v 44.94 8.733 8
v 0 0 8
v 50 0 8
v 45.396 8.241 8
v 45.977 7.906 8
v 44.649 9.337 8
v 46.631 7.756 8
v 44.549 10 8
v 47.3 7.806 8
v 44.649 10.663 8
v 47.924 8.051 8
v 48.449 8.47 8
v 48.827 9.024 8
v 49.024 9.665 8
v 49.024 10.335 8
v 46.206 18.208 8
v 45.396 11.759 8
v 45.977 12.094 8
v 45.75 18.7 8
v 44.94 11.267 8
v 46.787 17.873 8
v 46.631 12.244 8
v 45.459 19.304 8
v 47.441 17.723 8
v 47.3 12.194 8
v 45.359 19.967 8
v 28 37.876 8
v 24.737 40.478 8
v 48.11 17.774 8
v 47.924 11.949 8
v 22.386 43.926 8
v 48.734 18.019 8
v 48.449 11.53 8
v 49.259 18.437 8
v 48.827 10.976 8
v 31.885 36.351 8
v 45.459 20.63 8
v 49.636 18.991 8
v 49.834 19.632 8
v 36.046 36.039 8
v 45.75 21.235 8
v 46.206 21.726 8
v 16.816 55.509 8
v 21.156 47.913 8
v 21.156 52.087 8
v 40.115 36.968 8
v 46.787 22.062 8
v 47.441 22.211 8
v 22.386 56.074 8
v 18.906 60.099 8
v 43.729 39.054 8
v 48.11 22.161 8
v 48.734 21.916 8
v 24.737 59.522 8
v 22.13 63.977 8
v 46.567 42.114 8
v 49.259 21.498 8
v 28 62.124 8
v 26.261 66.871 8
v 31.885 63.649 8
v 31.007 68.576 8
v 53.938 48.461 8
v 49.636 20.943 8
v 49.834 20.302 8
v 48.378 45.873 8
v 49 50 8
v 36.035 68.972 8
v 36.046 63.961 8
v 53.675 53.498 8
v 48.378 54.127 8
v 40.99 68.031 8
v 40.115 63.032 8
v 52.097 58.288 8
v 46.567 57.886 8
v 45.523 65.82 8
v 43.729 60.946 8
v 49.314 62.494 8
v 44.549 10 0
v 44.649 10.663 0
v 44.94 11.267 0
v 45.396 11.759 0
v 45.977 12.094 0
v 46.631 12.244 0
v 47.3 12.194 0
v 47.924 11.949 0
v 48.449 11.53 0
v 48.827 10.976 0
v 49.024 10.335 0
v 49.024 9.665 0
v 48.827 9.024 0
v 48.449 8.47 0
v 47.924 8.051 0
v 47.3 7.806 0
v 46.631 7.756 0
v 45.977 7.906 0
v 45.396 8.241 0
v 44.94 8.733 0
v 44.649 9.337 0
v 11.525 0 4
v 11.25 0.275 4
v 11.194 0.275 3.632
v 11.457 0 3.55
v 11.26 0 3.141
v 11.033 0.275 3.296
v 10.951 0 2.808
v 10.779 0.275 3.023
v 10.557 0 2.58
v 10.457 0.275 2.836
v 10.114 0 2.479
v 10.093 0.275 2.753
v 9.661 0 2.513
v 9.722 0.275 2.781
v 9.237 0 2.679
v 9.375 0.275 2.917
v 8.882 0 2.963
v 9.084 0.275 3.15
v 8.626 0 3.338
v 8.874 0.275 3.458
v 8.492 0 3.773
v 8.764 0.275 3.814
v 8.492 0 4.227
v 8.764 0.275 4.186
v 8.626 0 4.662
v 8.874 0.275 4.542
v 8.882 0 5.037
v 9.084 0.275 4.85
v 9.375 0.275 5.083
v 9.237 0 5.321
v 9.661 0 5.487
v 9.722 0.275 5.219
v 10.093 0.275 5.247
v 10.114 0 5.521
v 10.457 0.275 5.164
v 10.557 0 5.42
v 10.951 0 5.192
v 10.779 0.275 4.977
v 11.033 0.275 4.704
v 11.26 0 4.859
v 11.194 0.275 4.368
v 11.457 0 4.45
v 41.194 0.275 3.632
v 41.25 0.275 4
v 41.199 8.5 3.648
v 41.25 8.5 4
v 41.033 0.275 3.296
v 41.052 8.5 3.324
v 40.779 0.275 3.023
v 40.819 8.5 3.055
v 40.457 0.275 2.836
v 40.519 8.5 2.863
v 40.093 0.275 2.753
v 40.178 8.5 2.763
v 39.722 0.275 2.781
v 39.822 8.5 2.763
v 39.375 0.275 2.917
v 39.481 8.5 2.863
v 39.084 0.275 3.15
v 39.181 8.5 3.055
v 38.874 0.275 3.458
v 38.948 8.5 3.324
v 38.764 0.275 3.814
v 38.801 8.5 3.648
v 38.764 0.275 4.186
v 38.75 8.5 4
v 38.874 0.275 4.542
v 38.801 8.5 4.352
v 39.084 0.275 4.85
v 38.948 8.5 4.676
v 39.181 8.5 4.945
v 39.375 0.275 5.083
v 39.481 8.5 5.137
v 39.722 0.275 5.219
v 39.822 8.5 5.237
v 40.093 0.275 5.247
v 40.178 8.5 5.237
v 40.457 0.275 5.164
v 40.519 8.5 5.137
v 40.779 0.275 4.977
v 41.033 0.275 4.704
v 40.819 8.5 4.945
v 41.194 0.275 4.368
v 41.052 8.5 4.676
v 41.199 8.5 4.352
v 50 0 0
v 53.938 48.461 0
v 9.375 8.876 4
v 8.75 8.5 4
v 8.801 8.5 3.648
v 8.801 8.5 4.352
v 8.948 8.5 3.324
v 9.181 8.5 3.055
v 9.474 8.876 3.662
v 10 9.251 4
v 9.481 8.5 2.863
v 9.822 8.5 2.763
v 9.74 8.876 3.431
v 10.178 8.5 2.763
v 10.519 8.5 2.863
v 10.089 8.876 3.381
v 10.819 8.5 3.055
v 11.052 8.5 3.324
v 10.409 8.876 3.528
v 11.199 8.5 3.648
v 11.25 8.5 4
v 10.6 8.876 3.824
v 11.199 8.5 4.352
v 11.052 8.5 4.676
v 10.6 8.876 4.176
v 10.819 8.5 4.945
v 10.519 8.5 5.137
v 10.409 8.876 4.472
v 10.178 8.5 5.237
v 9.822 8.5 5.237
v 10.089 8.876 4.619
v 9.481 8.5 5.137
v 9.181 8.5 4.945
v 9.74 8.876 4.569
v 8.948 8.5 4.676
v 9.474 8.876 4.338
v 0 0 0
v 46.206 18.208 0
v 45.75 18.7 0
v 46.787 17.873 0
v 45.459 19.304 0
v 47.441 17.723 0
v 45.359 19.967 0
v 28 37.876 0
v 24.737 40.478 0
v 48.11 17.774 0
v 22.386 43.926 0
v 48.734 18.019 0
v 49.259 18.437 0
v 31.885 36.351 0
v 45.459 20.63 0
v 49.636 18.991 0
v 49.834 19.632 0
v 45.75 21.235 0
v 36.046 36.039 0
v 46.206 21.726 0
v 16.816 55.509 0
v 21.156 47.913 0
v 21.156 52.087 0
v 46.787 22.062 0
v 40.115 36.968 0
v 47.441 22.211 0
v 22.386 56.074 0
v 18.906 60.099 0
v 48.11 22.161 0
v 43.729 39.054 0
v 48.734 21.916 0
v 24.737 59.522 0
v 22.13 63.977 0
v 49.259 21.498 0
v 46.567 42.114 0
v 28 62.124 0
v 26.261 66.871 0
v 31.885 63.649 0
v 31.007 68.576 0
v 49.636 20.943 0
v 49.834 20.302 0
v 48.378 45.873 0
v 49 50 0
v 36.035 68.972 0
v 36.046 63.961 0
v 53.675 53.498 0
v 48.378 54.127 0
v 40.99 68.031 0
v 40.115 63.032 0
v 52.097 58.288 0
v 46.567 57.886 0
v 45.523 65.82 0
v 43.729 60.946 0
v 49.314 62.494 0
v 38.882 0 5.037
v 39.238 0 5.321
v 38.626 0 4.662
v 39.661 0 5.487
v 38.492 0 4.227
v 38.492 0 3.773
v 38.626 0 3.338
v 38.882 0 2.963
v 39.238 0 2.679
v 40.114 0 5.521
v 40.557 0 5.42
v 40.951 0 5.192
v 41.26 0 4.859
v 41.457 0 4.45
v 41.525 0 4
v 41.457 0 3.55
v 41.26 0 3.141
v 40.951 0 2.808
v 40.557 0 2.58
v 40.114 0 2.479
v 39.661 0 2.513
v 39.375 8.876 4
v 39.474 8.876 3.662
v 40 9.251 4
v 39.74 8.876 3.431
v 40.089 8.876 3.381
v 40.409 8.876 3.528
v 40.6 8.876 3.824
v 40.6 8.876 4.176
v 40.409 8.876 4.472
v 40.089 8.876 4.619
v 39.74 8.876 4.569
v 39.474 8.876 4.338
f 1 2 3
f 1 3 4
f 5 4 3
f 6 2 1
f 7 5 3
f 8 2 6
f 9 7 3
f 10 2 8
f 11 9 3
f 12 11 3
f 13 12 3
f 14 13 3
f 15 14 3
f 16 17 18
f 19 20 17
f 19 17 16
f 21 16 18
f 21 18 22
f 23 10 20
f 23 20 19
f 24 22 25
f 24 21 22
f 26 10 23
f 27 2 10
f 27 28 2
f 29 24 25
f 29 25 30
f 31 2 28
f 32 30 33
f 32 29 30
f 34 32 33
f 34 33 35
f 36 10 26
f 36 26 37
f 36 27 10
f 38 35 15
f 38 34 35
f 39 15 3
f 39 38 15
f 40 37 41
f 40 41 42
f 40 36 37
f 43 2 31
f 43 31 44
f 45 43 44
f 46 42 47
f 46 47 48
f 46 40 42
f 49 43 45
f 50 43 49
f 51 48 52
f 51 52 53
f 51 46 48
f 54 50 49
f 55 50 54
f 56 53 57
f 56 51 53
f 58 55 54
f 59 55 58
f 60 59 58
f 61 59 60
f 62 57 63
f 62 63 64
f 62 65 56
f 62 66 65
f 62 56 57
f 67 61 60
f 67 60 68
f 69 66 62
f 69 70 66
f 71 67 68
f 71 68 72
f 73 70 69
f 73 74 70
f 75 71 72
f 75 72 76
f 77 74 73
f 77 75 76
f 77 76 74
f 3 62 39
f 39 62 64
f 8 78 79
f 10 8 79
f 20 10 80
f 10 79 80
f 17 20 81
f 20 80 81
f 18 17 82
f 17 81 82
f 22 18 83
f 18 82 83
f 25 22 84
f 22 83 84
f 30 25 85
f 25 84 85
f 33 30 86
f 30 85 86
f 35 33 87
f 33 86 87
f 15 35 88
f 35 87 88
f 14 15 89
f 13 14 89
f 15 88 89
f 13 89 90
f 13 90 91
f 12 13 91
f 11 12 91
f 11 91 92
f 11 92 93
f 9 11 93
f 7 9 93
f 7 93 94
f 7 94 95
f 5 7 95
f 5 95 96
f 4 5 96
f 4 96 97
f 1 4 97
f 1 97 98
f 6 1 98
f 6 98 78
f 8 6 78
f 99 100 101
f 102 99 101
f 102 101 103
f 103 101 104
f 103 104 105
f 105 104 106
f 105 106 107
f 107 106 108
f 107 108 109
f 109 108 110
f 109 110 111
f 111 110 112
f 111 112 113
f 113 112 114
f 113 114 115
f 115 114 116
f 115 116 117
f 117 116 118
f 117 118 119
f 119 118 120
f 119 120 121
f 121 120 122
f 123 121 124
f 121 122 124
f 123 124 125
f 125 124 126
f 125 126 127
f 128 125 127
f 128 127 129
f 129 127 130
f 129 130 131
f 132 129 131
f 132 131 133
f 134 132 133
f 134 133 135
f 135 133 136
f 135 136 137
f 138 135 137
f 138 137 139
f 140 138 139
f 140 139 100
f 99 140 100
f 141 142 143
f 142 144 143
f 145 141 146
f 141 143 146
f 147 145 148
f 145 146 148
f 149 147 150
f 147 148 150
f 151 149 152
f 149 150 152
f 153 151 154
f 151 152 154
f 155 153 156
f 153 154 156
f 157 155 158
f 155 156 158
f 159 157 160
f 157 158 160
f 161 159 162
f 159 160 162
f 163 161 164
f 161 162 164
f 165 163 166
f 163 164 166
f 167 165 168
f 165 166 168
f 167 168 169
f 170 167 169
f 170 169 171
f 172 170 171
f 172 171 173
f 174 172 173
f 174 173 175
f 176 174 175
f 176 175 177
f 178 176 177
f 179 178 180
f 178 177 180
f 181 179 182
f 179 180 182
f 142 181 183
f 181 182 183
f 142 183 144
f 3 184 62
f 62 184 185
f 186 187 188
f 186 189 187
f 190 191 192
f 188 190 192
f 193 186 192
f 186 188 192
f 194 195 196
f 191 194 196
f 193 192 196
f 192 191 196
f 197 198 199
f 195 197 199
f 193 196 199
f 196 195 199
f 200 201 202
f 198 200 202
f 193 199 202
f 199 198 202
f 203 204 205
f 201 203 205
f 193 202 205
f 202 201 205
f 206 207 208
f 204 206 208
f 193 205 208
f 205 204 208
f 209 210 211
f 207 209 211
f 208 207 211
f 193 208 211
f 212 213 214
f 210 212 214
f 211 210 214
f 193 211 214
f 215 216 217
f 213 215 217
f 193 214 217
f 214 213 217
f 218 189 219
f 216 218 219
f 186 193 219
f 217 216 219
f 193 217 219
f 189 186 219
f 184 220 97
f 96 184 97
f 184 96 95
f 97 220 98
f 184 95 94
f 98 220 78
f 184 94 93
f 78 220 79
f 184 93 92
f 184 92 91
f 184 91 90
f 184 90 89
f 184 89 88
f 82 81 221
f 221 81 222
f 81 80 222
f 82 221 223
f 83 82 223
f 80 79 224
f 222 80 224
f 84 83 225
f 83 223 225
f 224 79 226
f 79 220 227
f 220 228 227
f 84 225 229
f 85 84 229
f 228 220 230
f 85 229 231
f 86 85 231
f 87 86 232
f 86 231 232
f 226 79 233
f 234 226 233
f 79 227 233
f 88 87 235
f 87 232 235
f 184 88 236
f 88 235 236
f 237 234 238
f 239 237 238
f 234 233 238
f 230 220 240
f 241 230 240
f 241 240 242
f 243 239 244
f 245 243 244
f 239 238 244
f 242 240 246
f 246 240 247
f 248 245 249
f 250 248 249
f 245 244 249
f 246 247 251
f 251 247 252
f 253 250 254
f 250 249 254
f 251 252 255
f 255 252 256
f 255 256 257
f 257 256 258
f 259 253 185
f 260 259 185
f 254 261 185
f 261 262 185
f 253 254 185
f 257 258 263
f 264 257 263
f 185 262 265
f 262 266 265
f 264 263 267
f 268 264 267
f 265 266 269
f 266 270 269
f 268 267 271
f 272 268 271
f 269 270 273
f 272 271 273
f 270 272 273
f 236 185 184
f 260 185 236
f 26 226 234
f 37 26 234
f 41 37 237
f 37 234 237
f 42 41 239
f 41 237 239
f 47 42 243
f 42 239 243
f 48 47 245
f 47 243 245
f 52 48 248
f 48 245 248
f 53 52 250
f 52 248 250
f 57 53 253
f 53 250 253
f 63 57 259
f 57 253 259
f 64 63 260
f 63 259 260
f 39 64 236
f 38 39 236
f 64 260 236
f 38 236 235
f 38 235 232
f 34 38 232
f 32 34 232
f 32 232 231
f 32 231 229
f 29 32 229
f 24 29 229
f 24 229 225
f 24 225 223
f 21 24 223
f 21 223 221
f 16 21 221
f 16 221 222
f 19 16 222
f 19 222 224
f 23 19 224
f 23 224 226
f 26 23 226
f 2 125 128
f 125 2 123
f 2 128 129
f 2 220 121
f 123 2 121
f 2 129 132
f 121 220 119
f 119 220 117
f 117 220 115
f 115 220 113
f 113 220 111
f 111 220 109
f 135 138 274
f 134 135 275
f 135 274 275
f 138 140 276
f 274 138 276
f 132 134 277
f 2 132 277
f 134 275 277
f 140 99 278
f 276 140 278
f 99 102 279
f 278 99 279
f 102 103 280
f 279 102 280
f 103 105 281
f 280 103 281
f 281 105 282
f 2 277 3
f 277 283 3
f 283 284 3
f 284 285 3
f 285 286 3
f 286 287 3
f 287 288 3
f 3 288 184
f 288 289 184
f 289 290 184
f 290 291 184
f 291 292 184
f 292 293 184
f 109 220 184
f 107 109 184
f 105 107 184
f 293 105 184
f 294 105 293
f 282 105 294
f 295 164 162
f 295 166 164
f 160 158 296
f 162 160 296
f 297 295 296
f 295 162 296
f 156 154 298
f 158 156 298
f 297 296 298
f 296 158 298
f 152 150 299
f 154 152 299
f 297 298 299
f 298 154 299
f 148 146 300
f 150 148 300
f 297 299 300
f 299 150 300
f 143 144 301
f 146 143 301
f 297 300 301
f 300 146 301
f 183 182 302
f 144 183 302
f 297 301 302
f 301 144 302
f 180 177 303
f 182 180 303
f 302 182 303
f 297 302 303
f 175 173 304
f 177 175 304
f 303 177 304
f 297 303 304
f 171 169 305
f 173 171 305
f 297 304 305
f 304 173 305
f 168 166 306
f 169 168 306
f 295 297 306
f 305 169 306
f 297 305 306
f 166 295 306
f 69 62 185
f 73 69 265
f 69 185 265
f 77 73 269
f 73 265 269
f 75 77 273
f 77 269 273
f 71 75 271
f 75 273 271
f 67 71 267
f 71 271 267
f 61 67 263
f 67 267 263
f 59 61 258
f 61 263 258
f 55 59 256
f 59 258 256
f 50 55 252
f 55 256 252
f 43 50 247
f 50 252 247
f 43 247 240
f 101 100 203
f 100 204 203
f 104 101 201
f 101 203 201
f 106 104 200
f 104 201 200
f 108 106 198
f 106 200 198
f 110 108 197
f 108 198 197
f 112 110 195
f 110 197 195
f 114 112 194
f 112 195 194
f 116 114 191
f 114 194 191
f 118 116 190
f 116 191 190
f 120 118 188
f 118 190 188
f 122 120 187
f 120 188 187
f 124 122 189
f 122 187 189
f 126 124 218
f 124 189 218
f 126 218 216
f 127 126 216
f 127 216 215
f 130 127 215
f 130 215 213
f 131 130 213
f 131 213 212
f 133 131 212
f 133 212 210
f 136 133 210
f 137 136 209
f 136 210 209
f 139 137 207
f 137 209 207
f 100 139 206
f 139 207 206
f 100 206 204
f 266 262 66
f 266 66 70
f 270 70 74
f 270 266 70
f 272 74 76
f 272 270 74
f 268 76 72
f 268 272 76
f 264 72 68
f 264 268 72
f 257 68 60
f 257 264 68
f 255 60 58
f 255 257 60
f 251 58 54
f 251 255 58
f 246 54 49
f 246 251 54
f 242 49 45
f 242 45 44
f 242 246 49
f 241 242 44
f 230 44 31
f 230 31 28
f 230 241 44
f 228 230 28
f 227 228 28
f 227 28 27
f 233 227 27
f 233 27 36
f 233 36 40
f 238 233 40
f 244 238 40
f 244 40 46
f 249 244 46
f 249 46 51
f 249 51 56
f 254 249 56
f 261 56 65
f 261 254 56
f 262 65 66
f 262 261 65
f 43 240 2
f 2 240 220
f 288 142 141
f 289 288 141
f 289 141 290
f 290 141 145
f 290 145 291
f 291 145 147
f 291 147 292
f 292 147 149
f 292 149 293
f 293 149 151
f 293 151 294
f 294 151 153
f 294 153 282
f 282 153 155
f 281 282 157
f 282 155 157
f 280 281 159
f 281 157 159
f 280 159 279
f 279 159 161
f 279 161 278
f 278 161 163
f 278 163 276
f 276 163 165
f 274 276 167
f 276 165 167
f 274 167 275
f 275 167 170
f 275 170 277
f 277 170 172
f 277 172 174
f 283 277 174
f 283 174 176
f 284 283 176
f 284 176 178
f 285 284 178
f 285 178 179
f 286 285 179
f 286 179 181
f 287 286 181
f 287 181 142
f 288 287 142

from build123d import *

# Parameters (mm, degrees)
SKETCH_1_R                   = 19
SKETCH_1_R_2                 = 14
EXTRUDE_1_DEPTH              = 8
HOLE_WIZARD_M4_1_D           = 4.5
HOLE_WIZARD_M3_1_D           = 2.5
HOLE_WIZARD_M3_1_DEPTH       = 8.5
HOLE_WIZARD_M3_1_CSINK_D     = 3.05
HOLE_WIZARD_M3_1_CSINK_ANGLE = 90
HOLE_WIZARD_M3_1_TIP         = 0.751075774


with BuildPart() as part:
    # 스케치1 → 보스-돌출1 (new body)
    # profile 1 of 2: a face of its own
    with BuildSketch(Plane.XY):
        with BuildLine():
            Line((16.816107383, 55.508724832), (0, 0))
            Line((0, 0), (50, 0))
            Line((50, 0), (53.937590447, 48.461277134))
            ThreePointArc((53.937590447, 48.461277134), (31.456182162, 31.333416083), (16.816107383, 55.508724832))
        make_face()
    # profile 2 of 2: a face of its own
    with BuildSketch(Plane.XY):
        with Locations((35, 50)):
            Circle(SKETCH_1_R)
        with Locations((35, 50)):
            Circle(SKETCH_1_R_2, mode=Mode.SUBTRACT)
    extrude(amount=EXTRUDE_1_DEPTH)

    # M4 여유 구멍1 (through all)
    with Locations(Plane.XY.offset(8)):
        with Locations((46.799340892, 10), (47.609195032, 19.967152867)):
            Hole(HOLE_WIZARD_M4_1_D / 2)

    # M3 나사 구멍1
    with Locations(Plane(origin=(0, 0, 0), x_dir=(-1, 0, 0), z_dir=(0, -1, 0))):
        with Locations((-10, -4), (-40, -4)):
            CounterSinkHole(HOLE_WIZARD_M3_1_D / 2, HOLE_WIZARD_M3_1_CSINK_D / 2, depth=HOLE_WIZARD_M3_1_DEPTH, counter_sink_angle=HOLE_WIZARD_M3_1_CSINK_ANGLE)
            with Locations((0, 0, -(HOLE_WIZARD_M3_1_DEPTH + HOLE_WIZARD_M3_1_TIP / 2))):  # 118° drill point
                Cone(0, HOLE_WIZARD_M3_1_D / 2, HOLE_WIZARD_M3_1_TIP, mode=Mode.SUBTRACT)


solid = part.part
